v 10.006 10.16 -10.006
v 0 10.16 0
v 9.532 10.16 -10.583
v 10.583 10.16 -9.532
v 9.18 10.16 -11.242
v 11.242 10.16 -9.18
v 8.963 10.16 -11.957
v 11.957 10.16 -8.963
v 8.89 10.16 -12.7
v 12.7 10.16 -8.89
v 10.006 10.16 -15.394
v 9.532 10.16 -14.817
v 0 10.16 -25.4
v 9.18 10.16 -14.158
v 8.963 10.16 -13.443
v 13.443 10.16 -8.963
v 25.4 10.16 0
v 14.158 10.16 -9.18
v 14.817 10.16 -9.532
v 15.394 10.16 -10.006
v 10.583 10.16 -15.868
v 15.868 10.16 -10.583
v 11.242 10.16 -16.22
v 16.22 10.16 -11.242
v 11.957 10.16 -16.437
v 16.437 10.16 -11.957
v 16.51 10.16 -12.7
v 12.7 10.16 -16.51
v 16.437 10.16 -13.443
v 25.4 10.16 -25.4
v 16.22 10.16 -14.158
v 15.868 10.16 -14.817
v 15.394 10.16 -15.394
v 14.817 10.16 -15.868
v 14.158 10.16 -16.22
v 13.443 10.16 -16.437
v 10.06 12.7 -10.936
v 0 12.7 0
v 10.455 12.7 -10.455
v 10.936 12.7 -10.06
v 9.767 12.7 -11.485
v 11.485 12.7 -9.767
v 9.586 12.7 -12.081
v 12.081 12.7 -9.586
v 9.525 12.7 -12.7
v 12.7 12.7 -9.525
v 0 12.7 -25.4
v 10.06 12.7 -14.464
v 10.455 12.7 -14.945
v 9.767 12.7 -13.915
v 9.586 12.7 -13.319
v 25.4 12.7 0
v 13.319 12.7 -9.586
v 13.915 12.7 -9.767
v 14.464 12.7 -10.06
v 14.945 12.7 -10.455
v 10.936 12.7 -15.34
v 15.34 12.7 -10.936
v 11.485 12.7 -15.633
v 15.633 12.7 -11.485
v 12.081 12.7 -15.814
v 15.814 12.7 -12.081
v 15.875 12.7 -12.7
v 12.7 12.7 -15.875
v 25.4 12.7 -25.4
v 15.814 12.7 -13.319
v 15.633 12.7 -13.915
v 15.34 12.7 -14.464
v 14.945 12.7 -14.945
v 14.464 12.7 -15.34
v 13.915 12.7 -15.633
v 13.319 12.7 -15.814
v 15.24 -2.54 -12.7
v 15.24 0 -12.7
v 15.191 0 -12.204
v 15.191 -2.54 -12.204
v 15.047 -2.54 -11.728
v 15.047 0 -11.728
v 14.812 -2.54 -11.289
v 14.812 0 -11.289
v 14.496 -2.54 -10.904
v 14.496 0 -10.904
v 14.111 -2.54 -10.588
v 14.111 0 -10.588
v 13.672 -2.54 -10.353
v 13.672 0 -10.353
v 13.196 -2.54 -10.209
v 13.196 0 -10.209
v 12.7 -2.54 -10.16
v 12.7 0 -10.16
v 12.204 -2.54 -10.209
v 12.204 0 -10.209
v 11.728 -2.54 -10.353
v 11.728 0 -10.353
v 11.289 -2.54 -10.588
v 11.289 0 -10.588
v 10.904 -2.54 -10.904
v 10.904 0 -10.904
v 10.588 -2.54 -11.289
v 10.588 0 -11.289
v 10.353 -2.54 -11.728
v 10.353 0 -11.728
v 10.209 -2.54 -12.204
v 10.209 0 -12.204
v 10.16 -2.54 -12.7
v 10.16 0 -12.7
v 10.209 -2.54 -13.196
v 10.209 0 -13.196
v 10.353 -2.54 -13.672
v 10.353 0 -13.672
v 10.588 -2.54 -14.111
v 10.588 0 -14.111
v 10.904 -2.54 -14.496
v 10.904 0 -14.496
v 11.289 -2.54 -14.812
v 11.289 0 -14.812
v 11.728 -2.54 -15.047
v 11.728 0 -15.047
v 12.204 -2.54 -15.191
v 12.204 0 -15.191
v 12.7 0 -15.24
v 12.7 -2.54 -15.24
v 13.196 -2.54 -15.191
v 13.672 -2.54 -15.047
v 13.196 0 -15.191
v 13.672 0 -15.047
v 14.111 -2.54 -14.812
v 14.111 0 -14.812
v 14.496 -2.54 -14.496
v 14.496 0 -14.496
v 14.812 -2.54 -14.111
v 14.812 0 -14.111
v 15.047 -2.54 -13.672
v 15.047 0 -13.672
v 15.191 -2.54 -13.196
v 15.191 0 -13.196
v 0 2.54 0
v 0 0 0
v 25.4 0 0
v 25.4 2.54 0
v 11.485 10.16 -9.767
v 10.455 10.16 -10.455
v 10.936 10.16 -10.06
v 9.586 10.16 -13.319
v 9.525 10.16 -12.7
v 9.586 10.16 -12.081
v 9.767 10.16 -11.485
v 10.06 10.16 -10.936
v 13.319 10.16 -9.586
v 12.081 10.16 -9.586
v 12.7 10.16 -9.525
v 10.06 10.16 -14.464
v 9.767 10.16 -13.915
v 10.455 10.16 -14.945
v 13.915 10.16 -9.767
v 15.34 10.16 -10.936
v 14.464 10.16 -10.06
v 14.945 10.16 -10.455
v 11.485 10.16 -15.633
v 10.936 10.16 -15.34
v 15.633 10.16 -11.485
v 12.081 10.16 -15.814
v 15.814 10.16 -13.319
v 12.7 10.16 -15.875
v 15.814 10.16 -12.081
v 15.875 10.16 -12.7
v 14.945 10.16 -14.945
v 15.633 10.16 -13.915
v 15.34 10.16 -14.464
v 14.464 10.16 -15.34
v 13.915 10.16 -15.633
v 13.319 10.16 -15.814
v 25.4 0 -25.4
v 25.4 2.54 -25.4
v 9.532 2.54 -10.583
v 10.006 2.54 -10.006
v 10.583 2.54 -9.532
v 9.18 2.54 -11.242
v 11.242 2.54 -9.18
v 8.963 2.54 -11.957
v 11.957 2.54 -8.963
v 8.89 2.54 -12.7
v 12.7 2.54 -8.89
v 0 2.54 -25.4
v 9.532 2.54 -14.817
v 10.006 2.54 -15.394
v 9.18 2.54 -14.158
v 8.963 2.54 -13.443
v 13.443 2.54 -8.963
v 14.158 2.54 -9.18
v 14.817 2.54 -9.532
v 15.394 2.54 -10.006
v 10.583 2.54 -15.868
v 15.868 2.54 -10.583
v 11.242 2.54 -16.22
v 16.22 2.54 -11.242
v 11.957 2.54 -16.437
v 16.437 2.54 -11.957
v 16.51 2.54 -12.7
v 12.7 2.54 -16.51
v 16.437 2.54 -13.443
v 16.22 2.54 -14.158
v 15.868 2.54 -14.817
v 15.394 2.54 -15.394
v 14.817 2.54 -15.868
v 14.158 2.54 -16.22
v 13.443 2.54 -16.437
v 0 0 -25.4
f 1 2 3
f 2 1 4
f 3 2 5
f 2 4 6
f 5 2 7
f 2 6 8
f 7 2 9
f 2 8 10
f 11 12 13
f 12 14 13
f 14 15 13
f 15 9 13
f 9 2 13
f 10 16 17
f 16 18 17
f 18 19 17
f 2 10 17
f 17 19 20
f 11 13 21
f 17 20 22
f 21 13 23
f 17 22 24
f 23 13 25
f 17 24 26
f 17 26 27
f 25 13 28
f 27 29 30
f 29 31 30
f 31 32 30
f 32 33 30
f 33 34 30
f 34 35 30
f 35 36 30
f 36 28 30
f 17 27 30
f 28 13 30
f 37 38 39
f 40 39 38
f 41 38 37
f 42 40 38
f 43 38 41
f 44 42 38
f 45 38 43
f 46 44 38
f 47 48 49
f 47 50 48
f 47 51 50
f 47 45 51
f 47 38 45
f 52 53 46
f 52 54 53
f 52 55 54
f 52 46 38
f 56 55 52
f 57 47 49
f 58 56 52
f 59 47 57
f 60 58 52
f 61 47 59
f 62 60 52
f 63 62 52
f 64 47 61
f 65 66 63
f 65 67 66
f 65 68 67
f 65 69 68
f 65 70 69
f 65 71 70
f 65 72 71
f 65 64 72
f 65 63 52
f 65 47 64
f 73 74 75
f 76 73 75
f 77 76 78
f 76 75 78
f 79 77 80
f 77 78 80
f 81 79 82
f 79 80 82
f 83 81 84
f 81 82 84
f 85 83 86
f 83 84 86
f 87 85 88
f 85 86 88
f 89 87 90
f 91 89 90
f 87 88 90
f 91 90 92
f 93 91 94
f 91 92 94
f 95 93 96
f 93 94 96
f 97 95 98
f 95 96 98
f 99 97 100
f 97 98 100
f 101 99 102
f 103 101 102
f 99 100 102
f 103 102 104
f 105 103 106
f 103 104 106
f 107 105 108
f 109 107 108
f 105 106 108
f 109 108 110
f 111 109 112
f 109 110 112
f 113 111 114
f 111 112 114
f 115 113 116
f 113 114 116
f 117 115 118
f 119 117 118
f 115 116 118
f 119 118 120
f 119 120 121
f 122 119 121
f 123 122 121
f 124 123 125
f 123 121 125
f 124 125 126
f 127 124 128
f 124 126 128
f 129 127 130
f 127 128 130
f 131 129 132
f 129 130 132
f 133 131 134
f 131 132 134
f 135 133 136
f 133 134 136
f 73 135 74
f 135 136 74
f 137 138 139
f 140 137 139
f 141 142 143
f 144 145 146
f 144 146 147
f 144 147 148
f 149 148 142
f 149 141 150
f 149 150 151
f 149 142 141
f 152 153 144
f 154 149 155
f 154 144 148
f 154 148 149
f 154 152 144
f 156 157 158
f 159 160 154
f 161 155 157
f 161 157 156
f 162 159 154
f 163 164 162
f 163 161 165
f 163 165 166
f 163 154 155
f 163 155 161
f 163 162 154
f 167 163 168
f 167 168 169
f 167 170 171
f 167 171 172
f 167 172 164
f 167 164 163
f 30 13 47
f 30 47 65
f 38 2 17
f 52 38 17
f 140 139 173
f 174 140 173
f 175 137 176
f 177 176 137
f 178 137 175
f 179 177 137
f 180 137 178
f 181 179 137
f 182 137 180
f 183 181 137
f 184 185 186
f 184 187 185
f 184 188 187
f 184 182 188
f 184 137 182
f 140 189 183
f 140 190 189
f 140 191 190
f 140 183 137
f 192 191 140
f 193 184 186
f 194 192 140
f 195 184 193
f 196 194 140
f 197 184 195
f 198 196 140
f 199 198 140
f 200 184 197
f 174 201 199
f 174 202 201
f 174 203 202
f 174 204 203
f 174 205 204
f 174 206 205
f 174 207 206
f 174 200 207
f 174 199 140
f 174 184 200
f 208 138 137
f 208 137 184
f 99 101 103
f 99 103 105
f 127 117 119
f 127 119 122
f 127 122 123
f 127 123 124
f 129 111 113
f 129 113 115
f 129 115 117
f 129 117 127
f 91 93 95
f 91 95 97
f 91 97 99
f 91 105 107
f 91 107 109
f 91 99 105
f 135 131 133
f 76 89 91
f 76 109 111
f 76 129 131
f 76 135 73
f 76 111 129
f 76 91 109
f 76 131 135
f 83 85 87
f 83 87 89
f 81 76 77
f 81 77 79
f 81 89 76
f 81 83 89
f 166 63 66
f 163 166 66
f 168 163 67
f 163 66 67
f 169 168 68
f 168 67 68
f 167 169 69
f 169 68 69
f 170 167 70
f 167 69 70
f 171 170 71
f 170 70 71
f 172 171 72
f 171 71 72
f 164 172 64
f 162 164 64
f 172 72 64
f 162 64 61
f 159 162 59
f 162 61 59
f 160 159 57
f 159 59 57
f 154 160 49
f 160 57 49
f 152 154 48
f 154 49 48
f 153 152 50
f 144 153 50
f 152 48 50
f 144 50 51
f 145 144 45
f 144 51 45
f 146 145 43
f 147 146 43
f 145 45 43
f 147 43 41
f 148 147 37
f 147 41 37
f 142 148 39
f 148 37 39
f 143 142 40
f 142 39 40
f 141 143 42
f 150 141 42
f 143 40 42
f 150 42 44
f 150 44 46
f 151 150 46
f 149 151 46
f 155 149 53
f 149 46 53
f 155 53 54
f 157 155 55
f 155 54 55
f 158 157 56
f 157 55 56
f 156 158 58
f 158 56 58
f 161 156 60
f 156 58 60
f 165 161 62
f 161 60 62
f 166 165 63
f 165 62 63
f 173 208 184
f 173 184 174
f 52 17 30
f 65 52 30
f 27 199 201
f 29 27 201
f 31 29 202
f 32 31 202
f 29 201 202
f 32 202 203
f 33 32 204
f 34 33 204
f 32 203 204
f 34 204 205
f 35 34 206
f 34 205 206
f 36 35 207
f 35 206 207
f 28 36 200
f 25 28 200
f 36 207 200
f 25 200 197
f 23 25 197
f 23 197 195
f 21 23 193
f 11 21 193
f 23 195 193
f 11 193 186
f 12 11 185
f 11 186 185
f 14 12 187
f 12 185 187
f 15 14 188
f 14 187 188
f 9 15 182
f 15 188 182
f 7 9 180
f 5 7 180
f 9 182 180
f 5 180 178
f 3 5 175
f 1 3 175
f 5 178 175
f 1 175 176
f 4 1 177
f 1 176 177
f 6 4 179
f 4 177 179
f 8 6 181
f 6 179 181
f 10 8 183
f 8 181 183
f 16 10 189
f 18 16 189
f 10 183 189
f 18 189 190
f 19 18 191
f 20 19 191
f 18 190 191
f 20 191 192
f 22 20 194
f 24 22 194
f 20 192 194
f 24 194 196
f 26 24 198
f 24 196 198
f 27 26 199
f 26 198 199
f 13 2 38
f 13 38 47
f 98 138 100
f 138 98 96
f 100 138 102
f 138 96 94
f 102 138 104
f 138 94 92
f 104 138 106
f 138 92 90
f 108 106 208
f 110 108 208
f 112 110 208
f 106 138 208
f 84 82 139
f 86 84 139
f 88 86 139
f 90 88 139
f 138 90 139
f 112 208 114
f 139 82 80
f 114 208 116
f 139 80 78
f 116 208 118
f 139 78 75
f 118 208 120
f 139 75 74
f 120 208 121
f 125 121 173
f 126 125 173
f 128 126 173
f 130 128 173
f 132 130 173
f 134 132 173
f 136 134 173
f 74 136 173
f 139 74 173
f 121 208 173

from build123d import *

# Parameters (mm, degrees)
SKETCH1_W           = 25.4
SKETCH1_H           = 25.4
BOSS_EXTRUDE1_DEPTH = 2.54
SKETCH2_R           = 2.54
BOSS_EXTRUDE2_DEPTH = 2.54
SKETCH3_R           = 3.81
BOSS_EXTRUDE3_DEPTH = 7.62
SKETCH4_W           = 25.4
SKETCH4_H           = 25.4
BOSS_EXTRUDE4_DEPTH = 2.54
SKETCH5_R           = 3.175
CUT_EXTRUDE2_DEPTH  = 2.54


with BuildPart() as part:
    # Sketch1 → Boss-Extrude1 (new body)
    with BuildSketch(Plane(origin=(0, 0, 0), x_dir=(1, 0, 0), z_dir=(0, 1, 0))):
        with Locations((12.7, 12.7)):
            Rectangle(SKETCH1_W, SKETCH1_H)
    extrude(amount=BOSS_EXTRUDE1_DEPTH)

    # Sketch2 → Boss-Extrude2 (add)
    with BuildSketch(Plane.XZ):
        with Locations((12.7, -12.7)):
            Circle(SKETCH2_R)
    extrude(amount=BOSS_EXTRUDE2_DEPTH)

    # Sketch3 → Boss-Extrude3 (add)
    with BuildSketch(Plane(origin=(0, 2.54, 0), x_dir=(1, 0, 0), z_dir=(0, 1, 0))):
        with Locations((12.7, 12.7)):
            Circle(SKETCH3_R)
    extrude(amount=BOSS_EXTRUDE3_DEPTH)

    # Sketch4 → Boss-Extrude4 (add)
    with BuildSketch(Plane(origin=(0, 10.16, 0), x_dir=(1, 0, 0), z_dir=(0, 1, 0))):
        with Locations((12.7, 12.7)):
            Rectangle(SKETCH4_W, SKETCH4_H)
    extrude(amount=BOSS_EXTRUDE4_DEPTH)

    # Sketch5 → Cut-Extrude2 (cut)
    with BuildSketch(Plane(origin=(0, 12.7, 0), x_dir=(1, 0, 0), z_dir=(0, 1, 0))):
        with Locations((12.7, 12.7)):
            Circle(SKETCH5_R)
    extrude(amount=-CUT_EXTRUDE2_DEPTH, mode=Mode.SUBTRACT)


solid = part.part
